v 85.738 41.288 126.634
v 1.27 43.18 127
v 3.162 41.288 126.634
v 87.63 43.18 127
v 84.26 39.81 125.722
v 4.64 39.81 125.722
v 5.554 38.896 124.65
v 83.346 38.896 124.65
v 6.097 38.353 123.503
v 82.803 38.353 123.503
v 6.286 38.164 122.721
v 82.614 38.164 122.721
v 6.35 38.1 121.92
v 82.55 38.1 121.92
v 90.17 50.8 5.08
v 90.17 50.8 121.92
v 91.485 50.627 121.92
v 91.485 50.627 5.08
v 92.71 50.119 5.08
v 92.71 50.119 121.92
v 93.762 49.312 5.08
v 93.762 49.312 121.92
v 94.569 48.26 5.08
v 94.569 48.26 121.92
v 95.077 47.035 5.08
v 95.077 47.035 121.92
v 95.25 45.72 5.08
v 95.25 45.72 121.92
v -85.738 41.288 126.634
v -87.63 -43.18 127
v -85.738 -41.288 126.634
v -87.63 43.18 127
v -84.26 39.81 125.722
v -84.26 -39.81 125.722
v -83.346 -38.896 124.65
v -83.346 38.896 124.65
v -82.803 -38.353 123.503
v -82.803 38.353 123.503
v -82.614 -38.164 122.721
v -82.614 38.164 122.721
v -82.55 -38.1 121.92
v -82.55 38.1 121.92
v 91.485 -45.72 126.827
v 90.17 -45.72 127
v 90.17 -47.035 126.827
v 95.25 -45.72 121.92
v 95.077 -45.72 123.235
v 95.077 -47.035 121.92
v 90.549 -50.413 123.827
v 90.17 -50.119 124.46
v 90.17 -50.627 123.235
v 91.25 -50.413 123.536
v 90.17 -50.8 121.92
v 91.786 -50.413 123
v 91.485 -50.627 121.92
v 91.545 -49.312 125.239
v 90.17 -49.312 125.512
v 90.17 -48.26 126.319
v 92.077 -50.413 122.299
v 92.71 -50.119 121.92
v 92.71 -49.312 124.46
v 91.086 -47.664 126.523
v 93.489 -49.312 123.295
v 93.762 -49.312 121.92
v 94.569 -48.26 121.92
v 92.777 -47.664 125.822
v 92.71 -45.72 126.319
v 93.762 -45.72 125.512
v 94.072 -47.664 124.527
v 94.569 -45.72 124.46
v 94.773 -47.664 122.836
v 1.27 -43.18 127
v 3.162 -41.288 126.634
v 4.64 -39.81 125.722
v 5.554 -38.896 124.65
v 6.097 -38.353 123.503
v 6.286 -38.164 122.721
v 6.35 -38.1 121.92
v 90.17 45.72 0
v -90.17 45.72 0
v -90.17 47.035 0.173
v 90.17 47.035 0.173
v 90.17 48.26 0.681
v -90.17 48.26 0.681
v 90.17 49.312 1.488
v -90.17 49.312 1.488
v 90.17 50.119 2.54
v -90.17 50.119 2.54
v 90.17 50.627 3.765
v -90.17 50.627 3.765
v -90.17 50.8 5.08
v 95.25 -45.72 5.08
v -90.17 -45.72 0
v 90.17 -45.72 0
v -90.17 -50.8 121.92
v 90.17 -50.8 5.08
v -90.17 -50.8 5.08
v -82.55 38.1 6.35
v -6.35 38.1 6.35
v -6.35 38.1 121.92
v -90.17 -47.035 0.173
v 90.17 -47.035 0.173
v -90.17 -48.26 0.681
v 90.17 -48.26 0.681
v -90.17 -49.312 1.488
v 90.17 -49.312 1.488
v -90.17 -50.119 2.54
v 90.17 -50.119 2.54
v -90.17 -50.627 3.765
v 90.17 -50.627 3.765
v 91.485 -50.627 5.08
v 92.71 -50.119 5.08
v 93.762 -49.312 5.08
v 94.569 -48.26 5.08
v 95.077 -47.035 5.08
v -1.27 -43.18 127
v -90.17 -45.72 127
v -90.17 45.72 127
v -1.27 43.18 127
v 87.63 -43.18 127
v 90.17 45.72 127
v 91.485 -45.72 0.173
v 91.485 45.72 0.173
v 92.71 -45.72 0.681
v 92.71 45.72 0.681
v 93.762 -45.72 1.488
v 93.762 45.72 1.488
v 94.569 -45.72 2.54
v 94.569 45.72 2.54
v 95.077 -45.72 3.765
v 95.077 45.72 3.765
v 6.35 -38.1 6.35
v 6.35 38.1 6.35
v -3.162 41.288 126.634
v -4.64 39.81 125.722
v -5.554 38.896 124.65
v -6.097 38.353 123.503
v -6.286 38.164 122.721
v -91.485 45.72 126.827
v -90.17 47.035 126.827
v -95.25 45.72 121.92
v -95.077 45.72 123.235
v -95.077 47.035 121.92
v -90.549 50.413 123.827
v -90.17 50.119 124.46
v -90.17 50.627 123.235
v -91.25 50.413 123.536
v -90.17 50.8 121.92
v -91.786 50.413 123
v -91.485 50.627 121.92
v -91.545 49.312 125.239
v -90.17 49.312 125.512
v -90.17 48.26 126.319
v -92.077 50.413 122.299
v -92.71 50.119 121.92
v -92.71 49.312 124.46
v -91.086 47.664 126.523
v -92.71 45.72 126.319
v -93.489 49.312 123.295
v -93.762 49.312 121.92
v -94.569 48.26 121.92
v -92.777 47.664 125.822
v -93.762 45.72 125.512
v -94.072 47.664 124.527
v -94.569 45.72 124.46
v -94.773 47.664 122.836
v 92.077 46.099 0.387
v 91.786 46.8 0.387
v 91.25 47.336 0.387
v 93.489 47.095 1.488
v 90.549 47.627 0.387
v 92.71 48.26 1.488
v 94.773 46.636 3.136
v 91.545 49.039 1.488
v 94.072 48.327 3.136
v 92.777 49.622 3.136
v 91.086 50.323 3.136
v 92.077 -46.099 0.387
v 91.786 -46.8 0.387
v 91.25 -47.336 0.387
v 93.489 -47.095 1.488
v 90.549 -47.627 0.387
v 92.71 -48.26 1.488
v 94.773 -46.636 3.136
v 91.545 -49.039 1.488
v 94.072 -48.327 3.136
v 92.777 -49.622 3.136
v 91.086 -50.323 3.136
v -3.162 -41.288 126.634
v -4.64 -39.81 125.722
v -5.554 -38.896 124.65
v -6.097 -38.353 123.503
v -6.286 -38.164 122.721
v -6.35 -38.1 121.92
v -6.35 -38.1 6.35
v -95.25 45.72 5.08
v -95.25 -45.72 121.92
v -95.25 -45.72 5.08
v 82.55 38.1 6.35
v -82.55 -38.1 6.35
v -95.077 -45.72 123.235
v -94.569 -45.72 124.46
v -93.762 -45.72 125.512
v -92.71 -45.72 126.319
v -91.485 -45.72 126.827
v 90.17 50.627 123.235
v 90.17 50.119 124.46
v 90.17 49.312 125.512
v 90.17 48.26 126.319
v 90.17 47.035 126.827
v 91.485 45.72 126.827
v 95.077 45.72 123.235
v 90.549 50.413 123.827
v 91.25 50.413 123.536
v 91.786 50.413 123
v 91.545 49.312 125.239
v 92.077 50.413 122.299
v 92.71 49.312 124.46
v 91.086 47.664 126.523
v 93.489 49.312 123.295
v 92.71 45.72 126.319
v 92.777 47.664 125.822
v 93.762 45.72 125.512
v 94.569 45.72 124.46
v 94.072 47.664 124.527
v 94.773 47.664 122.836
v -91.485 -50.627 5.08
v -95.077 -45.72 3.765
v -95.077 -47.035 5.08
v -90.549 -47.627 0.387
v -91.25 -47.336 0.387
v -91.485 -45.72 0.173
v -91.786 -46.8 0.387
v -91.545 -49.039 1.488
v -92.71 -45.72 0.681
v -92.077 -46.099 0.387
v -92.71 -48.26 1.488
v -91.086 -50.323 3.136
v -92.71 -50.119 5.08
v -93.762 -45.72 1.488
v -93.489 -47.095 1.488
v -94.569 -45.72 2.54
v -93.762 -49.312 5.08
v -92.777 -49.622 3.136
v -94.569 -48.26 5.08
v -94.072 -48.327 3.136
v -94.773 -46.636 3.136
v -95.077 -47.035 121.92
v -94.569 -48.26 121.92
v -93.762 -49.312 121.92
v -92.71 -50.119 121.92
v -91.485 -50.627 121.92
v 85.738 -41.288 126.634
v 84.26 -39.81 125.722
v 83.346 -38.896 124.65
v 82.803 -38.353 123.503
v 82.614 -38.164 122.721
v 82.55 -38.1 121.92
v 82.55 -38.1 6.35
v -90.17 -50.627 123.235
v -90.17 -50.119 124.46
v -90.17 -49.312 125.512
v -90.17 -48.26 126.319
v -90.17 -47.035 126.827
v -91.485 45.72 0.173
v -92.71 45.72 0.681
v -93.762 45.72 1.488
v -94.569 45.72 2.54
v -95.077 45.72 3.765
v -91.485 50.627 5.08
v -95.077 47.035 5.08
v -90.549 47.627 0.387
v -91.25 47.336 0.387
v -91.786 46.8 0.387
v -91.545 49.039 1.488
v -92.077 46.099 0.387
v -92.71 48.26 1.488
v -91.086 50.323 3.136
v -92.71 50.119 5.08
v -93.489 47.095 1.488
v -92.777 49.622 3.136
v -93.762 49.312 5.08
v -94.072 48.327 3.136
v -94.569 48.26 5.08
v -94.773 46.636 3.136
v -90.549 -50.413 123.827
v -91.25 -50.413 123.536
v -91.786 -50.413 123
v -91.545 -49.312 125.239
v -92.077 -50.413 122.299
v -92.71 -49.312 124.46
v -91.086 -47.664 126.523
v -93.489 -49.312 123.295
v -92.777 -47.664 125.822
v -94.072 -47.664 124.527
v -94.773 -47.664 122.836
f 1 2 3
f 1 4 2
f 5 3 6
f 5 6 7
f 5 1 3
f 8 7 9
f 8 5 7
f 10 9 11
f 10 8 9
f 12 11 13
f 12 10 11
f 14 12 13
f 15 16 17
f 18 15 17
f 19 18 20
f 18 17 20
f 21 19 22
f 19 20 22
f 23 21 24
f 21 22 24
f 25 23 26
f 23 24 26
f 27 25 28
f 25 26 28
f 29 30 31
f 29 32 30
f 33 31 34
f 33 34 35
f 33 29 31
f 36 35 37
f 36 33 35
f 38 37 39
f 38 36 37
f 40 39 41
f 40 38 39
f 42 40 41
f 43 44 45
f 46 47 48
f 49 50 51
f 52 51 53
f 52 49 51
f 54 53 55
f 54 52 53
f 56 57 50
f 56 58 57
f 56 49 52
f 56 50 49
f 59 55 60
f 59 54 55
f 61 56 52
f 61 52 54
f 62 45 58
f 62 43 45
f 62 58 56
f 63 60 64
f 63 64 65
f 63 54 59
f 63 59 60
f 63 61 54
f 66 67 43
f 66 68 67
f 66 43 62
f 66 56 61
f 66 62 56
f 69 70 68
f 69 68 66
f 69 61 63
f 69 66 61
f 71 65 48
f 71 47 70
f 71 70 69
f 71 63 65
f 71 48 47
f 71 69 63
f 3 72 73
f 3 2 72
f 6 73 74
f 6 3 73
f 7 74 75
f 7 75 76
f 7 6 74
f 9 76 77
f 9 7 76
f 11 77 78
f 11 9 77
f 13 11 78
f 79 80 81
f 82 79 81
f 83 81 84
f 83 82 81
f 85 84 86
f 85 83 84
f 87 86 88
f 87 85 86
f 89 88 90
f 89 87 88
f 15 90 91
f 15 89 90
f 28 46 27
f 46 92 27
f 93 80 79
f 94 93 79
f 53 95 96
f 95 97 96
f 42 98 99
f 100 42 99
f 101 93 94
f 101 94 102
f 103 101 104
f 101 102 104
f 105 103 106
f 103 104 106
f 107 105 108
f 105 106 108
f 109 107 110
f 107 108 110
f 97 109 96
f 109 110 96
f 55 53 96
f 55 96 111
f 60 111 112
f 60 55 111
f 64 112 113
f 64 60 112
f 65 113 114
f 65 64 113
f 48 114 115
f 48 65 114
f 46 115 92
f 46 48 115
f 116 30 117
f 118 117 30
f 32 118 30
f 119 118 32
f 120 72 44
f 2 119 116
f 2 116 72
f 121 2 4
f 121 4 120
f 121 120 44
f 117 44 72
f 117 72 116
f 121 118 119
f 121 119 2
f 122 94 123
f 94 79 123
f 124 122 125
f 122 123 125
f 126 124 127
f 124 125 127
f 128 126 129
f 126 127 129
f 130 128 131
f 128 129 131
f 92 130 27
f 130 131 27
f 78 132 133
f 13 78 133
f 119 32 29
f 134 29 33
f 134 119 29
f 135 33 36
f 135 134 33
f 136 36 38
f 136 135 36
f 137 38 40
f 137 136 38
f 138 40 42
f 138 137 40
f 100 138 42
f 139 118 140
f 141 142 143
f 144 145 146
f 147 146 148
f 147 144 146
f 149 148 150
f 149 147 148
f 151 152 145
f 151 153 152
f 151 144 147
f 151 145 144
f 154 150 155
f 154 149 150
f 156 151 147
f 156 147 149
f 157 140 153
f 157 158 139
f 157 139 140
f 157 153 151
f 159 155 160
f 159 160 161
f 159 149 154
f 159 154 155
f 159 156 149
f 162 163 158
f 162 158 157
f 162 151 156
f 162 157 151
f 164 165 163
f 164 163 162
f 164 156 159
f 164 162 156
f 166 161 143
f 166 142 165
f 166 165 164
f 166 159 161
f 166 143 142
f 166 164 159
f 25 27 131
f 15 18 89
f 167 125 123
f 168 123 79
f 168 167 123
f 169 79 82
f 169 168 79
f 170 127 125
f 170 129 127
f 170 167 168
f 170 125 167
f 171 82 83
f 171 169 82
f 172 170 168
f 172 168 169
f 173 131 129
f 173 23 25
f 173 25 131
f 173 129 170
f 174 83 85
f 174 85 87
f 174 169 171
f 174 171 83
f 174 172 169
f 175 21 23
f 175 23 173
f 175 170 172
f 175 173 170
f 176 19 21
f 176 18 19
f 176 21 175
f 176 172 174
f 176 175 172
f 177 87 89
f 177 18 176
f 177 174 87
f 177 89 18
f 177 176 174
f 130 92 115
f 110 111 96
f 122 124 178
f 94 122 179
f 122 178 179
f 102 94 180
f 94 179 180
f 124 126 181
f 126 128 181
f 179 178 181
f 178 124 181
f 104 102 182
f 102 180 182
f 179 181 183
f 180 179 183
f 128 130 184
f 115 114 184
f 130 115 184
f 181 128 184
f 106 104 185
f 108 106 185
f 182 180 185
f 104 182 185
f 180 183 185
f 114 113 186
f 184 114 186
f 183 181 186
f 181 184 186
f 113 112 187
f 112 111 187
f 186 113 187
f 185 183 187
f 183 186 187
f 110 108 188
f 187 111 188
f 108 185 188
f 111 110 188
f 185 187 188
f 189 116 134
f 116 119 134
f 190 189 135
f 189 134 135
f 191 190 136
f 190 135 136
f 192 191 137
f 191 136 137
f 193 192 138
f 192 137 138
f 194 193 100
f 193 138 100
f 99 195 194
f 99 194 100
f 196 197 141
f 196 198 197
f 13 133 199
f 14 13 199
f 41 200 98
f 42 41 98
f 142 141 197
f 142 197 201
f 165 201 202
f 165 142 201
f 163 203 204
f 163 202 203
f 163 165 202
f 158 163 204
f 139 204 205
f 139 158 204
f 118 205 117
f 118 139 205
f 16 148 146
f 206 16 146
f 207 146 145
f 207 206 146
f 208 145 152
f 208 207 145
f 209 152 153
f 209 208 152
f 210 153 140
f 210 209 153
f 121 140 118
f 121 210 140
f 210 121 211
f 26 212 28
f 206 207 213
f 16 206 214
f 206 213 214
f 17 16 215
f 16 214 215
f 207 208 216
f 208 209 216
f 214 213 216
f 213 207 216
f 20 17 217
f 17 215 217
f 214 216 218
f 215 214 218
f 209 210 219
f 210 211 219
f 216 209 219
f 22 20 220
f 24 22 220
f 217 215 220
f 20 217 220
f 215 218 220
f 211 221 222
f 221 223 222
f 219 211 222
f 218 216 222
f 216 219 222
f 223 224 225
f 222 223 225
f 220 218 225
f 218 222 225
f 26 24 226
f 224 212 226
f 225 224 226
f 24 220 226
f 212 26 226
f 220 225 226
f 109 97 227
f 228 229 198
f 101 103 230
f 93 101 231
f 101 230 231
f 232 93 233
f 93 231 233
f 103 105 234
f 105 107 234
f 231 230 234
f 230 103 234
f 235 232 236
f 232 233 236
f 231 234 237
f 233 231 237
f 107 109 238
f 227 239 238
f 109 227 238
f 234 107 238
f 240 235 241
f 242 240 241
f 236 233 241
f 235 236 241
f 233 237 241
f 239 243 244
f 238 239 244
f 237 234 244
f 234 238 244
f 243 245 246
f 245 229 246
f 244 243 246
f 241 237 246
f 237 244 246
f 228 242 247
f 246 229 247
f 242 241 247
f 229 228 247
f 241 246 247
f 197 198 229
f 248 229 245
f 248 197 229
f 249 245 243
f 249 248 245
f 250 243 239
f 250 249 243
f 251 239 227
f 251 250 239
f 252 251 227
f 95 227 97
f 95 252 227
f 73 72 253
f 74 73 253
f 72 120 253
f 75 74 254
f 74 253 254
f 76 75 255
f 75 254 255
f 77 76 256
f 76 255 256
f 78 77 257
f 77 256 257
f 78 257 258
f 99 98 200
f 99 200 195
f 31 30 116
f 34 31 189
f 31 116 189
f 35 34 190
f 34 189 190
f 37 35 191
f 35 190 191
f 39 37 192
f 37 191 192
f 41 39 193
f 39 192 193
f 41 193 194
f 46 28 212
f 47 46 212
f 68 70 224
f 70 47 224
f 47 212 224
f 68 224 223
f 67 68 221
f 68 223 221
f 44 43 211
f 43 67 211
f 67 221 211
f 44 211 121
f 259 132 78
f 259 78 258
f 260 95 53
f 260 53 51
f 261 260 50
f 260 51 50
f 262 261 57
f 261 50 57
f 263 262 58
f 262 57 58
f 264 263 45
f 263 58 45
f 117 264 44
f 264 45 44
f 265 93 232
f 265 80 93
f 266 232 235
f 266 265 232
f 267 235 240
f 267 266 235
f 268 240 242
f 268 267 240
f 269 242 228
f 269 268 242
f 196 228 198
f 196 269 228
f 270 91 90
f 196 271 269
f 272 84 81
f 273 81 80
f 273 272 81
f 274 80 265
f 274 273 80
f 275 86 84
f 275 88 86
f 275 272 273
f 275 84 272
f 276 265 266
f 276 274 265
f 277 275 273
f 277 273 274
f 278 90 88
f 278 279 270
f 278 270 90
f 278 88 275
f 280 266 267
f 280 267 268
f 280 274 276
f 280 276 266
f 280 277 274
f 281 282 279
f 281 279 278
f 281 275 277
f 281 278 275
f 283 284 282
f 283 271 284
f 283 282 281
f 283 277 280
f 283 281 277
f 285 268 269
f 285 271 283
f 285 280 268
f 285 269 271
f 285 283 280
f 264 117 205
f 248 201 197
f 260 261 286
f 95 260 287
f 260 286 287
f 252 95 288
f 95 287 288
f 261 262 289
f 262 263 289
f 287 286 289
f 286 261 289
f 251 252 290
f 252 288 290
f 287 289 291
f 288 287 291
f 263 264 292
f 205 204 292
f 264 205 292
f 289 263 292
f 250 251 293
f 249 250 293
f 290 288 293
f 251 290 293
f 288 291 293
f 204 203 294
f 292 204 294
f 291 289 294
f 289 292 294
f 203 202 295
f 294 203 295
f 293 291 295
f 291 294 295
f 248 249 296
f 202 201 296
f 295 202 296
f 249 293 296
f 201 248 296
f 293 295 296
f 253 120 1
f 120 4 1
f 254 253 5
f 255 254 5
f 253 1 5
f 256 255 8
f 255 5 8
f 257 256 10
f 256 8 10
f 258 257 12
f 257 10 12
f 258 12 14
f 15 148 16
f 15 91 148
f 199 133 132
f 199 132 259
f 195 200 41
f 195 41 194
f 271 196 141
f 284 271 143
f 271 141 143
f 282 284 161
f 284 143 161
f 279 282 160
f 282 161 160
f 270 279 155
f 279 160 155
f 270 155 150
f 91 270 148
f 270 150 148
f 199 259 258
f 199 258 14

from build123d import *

# Parameters (mm, degrees)
F0_W     = 190.5
F0_H     = 101.6
F0_W_2   = 76.2
F0_H_2   = 76.2
F1_DEPTH = 127
F2_DEPTH = 6.35
F3_R     = 5.08


with BuildPart() as f1:
    # F0 (on Top) → F1 (new body)
    with BuildSketch(Plane.XY):
        Rectangle(F0_W, F0_H)
        with Locations((-44.45, 0)):
            Rectangle(F0_W_2, F0_H_2, mode=Mode.SUBTRACT)
        with Locations((44.45, 0)):
            Rectangle(F0_W_2, F0_H_2, mode=Mode.SUBTRACT)
    extrude(amount=F1_DEPTH)

    # F0 (on Top) → F2 (join)
    with BuildSketch(Plane.XY):
        with Locations((-44.45, 0)):
            Rectangle(F0_W_2, F0_H_2)
        with Locations((44.45, 0)):
            Rectangle(F0_W_2, F0_H_2)
    extrude(amount=F2_DEPTH)

    # F3
    f3_edges = [f1.edges().sort_by_distance(p)[0] for p in [
        (-95.25, 0, 127),
        (-82.55, 0, 127),
        (-44.45, 38.1, 127),
        (-6.35, 0, 127),
        (-44.45, -38.1, 127),
        (6.35, 0, 127),
        (44.45, -38.1, 127),
        (44.45, 38.1, 127),
        (82.55, 0, 127),
        (95.25, 0, 127),
        (0, -50.8, 127),
        (0, 50.8, 127),
        (95.25, -50.8, 63.5),
        (95.25, 50.8, 63.5),
        (-95.25, -50.8, 63.5),
        (-95.25, 50.8, 63.5),
        (95.25, 0, 0),
        (0, -50.8, 0),
        (0, 50.8, 0),
        (-95.25, 0, 0),
    ]]
    fillet(f3_edges, radius=F3_R)


solid = f1.part
